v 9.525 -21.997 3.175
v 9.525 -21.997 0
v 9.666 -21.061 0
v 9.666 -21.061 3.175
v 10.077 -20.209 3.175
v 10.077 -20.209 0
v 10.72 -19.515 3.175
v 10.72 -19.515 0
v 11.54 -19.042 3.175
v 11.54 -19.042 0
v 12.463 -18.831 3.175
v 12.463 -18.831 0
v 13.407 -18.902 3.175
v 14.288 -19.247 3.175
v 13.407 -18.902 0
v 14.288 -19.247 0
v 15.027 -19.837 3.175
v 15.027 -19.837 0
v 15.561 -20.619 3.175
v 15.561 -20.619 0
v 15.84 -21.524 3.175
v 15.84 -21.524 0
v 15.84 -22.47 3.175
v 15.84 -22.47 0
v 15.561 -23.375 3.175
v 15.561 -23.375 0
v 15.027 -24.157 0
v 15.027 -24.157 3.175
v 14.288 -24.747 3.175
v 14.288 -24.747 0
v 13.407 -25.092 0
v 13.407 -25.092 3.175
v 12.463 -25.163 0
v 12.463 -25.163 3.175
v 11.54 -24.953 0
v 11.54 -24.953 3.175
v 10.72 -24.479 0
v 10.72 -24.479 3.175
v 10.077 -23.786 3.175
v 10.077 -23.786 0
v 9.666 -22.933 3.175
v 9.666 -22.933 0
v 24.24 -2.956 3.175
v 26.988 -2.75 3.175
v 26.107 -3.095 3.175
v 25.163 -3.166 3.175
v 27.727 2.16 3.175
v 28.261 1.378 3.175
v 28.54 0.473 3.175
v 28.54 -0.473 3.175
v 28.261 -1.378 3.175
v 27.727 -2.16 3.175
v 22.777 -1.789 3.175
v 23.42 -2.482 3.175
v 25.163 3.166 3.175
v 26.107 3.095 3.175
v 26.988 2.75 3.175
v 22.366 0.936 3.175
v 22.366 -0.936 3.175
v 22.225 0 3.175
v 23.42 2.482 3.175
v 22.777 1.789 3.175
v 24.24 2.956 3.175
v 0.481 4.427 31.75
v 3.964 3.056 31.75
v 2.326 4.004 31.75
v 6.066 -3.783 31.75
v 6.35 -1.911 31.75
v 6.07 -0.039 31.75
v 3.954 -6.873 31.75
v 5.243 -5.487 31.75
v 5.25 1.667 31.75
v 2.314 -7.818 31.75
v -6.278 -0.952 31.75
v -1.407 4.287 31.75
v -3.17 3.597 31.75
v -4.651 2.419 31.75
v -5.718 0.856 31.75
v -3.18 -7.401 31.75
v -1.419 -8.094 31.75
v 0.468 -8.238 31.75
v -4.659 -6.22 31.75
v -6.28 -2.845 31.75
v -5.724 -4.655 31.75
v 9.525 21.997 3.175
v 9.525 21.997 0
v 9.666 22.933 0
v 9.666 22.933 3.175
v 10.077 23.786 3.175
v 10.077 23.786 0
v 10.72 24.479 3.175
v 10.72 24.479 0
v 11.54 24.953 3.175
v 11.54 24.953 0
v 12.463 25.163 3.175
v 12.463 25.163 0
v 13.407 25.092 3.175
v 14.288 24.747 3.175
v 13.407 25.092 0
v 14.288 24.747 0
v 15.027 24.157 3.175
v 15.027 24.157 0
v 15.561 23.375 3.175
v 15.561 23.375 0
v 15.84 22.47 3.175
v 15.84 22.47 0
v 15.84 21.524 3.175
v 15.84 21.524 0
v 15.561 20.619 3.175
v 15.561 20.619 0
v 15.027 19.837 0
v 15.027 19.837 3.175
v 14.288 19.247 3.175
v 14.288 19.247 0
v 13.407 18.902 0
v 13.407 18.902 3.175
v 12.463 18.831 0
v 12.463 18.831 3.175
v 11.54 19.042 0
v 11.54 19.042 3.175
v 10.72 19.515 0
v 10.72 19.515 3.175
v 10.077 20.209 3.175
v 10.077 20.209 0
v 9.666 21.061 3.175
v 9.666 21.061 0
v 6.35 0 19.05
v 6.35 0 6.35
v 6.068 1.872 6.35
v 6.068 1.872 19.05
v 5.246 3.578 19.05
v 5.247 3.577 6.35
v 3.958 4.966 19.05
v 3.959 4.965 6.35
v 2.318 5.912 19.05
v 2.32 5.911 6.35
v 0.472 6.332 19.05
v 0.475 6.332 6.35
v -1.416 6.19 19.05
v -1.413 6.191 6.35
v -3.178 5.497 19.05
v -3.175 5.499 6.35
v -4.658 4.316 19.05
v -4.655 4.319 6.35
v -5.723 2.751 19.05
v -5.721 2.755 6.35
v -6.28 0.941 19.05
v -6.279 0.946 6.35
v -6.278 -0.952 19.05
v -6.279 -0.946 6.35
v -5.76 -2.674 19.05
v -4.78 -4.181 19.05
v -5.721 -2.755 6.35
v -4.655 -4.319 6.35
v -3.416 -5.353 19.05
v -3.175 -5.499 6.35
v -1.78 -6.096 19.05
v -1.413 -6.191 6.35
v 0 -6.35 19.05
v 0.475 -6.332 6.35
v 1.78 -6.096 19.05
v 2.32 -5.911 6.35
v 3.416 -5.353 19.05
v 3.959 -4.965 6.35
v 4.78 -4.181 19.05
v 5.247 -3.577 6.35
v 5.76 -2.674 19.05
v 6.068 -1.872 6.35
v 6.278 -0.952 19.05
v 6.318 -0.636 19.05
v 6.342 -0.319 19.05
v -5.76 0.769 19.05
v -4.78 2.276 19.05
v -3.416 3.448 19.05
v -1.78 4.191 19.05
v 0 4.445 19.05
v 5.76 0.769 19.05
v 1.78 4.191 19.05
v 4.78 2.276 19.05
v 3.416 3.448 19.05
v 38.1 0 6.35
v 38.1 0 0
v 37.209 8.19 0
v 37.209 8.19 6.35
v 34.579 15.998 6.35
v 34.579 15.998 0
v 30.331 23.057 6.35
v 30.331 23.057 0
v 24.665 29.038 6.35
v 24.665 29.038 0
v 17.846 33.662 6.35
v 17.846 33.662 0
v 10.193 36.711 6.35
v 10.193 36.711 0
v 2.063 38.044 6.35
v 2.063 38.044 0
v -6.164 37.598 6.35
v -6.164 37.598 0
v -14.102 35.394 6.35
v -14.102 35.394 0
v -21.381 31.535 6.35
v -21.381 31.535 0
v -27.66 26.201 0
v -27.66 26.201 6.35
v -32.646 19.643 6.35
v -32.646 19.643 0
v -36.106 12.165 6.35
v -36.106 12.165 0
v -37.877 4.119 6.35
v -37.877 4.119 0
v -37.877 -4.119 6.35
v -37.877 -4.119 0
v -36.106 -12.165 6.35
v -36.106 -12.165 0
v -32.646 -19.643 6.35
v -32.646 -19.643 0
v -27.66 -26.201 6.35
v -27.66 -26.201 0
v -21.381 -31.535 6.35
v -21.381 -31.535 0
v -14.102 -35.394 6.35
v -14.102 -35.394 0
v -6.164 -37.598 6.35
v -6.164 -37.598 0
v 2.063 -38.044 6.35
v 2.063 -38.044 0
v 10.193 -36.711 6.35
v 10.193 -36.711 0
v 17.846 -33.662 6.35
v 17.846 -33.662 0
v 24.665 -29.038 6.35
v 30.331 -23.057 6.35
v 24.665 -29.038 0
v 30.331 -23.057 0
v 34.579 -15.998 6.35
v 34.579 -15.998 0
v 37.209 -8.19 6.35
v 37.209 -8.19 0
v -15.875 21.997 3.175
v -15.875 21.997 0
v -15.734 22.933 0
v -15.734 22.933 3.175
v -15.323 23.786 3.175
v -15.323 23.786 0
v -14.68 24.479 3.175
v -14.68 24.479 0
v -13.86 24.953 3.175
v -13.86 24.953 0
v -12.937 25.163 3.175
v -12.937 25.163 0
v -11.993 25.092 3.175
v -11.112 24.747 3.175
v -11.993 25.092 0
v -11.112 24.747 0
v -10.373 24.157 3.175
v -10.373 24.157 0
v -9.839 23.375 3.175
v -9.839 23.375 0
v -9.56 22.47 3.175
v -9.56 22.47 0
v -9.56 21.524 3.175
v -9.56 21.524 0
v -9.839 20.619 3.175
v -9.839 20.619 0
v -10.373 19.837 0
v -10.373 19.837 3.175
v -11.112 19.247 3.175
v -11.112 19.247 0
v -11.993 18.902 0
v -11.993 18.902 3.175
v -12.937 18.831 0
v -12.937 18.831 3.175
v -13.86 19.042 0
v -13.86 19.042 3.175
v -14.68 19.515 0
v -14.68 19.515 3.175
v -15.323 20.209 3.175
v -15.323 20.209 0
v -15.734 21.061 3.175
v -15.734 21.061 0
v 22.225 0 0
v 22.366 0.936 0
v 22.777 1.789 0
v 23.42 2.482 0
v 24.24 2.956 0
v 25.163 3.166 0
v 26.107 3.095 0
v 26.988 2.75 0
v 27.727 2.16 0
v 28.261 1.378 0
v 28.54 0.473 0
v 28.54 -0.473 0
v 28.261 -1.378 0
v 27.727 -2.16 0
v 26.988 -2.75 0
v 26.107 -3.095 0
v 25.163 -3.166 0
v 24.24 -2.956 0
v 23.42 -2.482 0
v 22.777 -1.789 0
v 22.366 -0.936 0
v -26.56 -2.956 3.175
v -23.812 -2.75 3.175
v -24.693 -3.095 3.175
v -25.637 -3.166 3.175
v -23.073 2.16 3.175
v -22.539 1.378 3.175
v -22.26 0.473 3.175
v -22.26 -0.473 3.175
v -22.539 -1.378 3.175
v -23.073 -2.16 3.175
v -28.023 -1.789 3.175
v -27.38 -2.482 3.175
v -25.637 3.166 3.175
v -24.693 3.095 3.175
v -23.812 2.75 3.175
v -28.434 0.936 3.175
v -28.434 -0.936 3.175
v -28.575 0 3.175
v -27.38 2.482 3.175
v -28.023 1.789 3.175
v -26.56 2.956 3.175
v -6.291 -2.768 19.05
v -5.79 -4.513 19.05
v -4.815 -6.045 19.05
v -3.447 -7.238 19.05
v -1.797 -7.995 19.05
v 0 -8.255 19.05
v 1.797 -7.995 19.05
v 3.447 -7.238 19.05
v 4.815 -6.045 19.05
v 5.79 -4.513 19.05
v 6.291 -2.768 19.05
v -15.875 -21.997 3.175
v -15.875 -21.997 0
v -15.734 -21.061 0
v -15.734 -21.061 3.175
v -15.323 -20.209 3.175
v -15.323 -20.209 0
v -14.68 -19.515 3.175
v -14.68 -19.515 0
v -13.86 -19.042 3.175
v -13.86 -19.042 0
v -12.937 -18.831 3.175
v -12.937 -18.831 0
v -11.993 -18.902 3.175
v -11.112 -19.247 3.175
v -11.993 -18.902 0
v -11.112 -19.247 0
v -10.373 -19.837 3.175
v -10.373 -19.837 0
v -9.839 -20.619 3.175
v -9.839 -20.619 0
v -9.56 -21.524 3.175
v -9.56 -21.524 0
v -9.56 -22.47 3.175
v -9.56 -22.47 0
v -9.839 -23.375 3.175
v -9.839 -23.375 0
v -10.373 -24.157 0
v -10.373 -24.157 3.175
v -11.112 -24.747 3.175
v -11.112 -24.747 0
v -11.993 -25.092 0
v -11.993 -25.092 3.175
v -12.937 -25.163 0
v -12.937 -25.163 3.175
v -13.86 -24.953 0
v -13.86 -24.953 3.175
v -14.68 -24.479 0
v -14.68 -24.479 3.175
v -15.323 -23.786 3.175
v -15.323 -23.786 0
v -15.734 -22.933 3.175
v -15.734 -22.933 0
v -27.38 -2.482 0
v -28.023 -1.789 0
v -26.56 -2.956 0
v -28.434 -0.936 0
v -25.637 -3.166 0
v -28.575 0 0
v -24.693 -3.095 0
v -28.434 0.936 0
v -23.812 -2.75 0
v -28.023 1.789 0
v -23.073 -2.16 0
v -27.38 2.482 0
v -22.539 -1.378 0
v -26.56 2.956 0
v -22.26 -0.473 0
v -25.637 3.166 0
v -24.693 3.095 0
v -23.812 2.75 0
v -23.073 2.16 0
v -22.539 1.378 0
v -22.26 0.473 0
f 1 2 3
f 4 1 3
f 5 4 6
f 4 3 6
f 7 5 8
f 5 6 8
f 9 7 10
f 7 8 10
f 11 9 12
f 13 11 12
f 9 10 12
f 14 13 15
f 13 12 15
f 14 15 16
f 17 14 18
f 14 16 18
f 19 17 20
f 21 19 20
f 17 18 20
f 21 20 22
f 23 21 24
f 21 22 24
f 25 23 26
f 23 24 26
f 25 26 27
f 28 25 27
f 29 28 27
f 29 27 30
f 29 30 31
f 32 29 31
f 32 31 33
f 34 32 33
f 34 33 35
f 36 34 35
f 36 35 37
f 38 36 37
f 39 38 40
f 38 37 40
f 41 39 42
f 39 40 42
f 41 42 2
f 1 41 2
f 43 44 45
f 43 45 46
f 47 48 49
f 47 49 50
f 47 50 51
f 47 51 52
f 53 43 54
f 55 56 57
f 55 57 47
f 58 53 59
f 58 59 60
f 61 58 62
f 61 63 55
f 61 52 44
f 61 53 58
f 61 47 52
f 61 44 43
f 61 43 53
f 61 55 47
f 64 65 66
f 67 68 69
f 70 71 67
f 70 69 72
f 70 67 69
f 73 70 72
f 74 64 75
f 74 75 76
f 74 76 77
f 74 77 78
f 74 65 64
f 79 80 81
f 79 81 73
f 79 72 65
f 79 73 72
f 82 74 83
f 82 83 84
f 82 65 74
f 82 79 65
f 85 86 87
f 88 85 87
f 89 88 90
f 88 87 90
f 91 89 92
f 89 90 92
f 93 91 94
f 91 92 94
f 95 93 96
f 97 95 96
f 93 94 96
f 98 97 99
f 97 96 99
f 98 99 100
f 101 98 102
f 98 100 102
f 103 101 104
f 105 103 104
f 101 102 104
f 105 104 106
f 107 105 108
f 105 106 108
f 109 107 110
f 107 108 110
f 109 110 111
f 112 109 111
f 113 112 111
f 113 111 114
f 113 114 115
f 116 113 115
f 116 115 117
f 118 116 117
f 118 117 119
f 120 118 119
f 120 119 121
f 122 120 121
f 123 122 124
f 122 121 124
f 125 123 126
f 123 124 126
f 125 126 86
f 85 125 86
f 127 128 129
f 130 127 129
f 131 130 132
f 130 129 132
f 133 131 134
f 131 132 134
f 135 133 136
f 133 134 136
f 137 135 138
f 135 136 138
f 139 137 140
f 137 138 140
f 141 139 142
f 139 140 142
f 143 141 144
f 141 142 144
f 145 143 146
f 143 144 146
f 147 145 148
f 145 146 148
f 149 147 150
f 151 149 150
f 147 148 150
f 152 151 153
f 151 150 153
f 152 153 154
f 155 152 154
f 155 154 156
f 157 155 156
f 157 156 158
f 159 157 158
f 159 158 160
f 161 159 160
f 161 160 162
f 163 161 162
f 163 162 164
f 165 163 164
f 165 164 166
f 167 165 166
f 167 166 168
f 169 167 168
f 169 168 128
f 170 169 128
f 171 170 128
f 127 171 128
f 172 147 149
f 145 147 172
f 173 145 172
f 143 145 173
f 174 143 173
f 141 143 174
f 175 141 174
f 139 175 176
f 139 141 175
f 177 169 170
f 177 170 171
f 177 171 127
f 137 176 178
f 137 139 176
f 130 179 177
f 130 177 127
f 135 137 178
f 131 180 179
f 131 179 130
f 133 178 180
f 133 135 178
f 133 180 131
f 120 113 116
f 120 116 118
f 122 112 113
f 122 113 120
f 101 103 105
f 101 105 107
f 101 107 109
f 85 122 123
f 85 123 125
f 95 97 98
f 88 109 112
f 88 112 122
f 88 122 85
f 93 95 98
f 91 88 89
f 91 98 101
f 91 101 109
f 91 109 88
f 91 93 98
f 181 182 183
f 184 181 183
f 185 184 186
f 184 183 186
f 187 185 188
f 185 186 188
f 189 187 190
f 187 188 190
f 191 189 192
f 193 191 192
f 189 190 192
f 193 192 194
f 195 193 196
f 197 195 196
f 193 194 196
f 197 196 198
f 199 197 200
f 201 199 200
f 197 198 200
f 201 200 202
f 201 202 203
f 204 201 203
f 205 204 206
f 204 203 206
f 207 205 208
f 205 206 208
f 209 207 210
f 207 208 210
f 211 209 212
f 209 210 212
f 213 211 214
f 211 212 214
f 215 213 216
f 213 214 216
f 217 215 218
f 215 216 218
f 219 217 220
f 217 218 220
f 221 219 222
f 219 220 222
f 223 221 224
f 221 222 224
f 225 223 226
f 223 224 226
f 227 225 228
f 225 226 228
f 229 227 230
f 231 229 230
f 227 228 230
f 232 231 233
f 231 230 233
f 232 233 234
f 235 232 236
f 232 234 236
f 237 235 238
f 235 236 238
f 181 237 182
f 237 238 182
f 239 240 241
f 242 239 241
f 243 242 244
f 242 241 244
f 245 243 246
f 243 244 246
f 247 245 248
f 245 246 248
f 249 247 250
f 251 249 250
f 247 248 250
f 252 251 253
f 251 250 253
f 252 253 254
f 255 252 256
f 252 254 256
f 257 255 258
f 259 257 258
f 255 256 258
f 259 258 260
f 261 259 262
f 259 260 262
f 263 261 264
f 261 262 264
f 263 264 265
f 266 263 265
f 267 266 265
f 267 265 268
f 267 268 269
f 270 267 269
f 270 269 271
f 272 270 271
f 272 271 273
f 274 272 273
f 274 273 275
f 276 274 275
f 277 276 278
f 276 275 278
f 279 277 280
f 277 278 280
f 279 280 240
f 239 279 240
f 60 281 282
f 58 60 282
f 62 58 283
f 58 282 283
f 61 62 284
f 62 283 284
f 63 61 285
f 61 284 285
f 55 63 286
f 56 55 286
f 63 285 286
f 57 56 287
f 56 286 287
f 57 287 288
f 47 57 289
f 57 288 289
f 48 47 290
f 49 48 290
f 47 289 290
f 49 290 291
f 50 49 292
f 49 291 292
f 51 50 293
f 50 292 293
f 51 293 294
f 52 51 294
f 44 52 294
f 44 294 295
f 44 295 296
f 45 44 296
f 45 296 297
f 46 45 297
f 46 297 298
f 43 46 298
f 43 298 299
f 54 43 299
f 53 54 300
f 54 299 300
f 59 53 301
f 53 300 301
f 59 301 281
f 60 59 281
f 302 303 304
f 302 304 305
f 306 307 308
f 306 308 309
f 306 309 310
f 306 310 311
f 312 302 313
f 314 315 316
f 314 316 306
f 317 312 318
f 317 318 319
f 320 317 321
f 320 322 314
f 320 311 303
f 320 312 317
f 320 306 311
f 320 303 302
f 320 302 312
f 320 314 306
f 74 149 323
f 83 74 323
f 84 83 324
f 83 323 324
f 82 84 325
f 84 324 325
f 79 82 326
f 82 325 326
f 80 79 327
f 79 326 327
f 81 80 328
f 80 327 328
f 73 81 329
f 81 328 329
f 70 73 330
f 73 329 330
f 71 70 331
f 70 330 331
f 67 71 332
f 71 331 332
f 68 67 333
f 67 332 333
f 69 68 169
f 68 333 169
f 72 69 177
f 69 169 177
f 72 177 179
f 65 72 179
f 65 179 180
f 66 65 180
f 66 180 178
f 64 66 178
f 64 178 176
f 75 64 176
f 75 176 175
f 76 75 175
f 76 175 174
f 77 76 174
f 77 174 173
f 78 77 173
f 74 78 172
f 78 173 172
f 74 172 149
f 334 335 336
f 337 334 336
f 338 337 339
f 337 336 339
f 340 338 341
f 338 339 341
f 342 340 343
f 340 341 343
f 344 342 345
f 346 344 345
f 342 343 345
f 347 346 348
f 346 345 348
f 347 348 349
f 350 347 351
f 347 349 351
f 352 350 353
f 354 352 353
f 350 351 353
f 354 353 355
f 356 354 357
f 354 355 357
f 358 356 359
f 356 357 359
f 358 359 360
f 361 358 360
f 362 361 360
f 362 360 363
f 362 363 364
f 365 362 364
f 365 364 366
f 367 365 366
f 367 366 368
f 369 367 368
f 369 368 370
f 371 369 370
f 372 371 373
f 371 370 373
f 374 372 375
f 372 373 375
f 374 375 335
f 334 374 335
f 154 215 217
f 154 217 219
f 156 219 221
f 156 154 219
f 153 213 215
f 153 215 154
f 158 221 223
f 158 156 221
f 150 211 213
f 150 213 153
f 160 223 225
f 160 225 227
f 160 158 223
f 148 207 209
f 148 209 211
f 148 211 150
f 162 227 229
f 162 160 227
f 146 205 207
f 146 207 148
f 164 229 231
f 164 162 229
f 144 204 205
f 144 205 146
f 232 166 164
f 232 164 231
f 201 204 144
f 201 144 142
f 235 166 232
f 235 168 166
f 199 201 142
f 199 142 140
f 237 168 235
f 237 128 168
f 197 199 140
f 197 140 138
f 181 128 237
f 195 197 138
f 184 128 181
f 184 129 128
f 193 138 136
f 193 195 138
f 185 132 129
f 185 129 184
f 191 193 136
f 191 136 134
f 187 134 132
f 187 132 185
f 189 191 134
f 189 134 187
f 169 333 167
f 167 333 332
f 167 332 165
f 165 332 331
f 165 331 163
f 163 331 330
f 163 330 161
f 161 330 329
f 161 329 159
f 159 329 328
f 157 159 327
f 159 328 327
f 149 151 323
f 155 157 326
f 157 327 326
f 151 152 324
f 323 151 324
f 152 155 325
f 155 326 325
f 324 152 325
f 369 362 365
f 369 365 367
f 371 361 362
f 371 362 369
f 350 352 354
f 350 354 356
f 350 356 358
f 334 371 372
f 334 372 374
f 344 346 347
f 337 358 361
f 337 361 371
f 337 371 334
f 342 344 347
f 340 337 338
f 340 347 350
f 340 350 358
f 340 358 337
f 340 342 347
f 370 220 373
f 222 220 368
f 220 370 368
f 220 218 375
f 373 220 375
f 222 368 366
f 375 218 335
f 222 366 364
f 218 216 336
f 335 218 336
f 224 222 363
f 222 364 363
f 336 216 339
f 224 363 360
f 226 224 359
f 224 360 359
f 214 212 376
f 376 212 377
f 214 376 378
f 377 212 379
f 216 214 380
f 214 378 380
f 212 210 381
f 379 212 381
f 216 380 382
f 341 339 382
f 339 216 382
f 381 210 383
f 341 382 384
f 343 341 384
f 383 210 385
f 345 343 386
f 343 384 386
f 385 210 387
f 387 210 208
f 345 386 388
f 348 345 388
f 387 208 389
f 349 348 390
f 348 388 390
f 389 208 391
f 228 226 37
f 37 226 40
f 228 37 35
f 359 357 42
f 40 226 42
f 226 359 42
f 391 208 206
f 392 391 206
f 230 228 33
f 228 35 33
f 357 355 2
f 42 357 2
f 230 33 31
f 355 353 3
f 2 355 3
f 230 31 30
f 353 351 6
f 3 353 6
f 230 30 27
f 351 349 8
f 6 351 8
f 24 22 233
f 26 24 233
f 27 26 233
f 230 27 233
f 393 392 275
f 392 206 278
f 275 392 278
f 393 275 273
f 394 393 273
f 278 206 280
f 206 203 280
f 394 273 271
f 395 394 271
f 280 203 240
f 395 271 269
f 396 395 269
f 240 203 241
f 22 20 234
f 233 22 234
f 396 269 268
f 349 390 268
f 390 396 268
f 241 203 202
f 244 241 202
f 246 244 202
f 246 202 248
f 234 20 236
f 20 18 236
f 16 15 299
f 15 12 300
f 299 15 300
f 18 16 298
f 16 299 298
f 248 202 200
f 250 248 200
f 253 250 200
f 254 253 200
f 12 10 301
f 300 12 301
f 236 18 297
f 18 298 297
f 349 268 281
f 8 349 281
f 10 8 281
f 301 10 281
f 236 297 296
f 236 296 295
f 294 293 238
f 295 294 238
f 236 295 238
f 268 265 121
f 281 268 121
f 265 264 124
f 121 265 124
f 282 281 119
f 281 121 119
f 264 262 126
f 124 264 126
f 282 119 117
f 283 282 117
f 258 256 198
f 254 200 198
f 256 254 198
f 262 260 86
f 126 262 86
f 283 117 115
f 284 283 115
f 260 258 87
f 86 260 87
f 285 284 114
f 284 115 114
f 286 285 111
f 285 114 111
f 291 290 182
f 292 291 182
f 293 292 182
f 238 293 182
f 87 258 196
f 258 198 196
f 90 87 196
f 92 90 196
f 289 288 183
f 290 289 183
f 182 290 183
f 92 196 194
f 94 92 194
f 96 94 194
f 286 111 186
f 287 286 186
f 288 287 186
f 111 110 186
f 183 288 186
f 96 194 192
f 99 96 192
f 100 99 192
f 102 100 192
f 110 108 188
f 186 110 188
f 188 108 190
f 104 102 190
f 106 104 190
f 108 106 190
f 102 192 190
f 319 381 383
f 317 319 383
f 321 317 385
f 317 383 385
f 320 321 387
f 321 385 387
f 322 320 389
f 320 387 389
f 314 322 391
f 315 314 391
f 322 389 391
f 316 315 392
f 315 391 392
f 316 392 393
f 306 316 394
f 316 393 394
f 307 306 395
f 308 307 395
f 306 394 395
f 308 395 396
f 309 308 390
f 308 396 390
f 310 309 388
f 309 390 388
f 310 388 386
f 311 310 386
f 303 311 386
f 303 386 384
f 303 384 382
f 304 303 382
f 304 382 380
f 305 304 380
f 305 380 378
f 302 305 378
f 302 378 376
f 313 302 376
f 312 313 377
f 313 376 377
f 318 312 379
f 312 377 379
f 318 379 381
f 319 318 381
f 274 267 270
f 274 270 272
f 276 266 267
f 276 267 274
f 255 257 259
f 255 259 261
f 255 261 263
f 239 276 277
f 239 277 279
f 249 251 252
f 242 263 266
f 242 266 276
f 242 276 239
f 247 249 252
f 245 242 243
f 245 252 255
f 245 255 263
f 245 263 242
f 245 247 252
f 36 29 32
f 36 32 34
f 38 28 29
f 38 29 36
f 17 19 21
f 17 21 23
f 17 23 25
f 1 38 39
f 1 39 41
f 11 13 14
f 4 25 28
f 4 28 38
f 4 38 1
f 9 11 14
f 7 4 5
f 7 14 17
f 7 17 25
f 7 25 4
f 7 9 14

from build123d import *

# Parameters (mm, degrees)
SKETCH1_R           = 38.1
BOSS_EXTRUDE1_DEPTH = 6.35
SKETCH2_R           = 6.35
BOSS_EXTRUDE2_DEPTH = 12.7
SKETCH3_R           = 6.35
BOSS_EXTRUDE3_DEPTH = 12.7
SKETCH4_R           = 3.175
CUT_EXTRUDE1_DEPTH  = 3.175


with BuildPart() as part:
    # Sketch1 → Boss-Extrude1 (new body)
    with BuildSketch(Plane.XY):
        Circle(SKETCH1_R)
    extrude(amount=BOSS_EXTRUDE1_DEPTH)

    # Sketch2 → Boss-Extrude2 (add)
    with BuildSketch(Plane.XY.offset(6.35)):
        Circle(SKETCH2_R)
    extrude(amount=BOSS_EXTRUDE2_DEPTH)

    # Sketch3 → Boss-Extrude3 (add)
    with BuildSketch(Plane.XY.offset(19.05)):
        with Locations(Location((0, -1.905, 0), (0, 0, 171.373073441))):
            Circle(SKETCH3_R)
    extrude(amount=BOSS_EXTRUDE3_DEPTH)

    # Sketch4 → Cut-Extrude1 (cut)
    with BuildSketch(Plane(origin=(0, 0, 0), x_dir=(-1, 0, 0), z_dir=(0, 0, -1))):
        with Locations((-25.4, 0)):
            Circle(SKETCH4_R)
        with Locations((-12.7, 21.997045256)):
            Circle(SKETCH4_R)
        with Locations((12.7, 21.997045256)):
            Circle(SKETCH4_R)
        with Locations((25.4, 0)):
            Circle(SKETCH4_R)
        with Locations((12.7, -21.997045256)):
            Circle(SKETCH4_R)
        with Locations((-12.7, -21.997045256)):
            Circle(SKETCH4_R)
    extrude(amount=-CUT_EXTRUDE1_DEPTH, mode=Mode.SUBTRACT)


solid = part.part
